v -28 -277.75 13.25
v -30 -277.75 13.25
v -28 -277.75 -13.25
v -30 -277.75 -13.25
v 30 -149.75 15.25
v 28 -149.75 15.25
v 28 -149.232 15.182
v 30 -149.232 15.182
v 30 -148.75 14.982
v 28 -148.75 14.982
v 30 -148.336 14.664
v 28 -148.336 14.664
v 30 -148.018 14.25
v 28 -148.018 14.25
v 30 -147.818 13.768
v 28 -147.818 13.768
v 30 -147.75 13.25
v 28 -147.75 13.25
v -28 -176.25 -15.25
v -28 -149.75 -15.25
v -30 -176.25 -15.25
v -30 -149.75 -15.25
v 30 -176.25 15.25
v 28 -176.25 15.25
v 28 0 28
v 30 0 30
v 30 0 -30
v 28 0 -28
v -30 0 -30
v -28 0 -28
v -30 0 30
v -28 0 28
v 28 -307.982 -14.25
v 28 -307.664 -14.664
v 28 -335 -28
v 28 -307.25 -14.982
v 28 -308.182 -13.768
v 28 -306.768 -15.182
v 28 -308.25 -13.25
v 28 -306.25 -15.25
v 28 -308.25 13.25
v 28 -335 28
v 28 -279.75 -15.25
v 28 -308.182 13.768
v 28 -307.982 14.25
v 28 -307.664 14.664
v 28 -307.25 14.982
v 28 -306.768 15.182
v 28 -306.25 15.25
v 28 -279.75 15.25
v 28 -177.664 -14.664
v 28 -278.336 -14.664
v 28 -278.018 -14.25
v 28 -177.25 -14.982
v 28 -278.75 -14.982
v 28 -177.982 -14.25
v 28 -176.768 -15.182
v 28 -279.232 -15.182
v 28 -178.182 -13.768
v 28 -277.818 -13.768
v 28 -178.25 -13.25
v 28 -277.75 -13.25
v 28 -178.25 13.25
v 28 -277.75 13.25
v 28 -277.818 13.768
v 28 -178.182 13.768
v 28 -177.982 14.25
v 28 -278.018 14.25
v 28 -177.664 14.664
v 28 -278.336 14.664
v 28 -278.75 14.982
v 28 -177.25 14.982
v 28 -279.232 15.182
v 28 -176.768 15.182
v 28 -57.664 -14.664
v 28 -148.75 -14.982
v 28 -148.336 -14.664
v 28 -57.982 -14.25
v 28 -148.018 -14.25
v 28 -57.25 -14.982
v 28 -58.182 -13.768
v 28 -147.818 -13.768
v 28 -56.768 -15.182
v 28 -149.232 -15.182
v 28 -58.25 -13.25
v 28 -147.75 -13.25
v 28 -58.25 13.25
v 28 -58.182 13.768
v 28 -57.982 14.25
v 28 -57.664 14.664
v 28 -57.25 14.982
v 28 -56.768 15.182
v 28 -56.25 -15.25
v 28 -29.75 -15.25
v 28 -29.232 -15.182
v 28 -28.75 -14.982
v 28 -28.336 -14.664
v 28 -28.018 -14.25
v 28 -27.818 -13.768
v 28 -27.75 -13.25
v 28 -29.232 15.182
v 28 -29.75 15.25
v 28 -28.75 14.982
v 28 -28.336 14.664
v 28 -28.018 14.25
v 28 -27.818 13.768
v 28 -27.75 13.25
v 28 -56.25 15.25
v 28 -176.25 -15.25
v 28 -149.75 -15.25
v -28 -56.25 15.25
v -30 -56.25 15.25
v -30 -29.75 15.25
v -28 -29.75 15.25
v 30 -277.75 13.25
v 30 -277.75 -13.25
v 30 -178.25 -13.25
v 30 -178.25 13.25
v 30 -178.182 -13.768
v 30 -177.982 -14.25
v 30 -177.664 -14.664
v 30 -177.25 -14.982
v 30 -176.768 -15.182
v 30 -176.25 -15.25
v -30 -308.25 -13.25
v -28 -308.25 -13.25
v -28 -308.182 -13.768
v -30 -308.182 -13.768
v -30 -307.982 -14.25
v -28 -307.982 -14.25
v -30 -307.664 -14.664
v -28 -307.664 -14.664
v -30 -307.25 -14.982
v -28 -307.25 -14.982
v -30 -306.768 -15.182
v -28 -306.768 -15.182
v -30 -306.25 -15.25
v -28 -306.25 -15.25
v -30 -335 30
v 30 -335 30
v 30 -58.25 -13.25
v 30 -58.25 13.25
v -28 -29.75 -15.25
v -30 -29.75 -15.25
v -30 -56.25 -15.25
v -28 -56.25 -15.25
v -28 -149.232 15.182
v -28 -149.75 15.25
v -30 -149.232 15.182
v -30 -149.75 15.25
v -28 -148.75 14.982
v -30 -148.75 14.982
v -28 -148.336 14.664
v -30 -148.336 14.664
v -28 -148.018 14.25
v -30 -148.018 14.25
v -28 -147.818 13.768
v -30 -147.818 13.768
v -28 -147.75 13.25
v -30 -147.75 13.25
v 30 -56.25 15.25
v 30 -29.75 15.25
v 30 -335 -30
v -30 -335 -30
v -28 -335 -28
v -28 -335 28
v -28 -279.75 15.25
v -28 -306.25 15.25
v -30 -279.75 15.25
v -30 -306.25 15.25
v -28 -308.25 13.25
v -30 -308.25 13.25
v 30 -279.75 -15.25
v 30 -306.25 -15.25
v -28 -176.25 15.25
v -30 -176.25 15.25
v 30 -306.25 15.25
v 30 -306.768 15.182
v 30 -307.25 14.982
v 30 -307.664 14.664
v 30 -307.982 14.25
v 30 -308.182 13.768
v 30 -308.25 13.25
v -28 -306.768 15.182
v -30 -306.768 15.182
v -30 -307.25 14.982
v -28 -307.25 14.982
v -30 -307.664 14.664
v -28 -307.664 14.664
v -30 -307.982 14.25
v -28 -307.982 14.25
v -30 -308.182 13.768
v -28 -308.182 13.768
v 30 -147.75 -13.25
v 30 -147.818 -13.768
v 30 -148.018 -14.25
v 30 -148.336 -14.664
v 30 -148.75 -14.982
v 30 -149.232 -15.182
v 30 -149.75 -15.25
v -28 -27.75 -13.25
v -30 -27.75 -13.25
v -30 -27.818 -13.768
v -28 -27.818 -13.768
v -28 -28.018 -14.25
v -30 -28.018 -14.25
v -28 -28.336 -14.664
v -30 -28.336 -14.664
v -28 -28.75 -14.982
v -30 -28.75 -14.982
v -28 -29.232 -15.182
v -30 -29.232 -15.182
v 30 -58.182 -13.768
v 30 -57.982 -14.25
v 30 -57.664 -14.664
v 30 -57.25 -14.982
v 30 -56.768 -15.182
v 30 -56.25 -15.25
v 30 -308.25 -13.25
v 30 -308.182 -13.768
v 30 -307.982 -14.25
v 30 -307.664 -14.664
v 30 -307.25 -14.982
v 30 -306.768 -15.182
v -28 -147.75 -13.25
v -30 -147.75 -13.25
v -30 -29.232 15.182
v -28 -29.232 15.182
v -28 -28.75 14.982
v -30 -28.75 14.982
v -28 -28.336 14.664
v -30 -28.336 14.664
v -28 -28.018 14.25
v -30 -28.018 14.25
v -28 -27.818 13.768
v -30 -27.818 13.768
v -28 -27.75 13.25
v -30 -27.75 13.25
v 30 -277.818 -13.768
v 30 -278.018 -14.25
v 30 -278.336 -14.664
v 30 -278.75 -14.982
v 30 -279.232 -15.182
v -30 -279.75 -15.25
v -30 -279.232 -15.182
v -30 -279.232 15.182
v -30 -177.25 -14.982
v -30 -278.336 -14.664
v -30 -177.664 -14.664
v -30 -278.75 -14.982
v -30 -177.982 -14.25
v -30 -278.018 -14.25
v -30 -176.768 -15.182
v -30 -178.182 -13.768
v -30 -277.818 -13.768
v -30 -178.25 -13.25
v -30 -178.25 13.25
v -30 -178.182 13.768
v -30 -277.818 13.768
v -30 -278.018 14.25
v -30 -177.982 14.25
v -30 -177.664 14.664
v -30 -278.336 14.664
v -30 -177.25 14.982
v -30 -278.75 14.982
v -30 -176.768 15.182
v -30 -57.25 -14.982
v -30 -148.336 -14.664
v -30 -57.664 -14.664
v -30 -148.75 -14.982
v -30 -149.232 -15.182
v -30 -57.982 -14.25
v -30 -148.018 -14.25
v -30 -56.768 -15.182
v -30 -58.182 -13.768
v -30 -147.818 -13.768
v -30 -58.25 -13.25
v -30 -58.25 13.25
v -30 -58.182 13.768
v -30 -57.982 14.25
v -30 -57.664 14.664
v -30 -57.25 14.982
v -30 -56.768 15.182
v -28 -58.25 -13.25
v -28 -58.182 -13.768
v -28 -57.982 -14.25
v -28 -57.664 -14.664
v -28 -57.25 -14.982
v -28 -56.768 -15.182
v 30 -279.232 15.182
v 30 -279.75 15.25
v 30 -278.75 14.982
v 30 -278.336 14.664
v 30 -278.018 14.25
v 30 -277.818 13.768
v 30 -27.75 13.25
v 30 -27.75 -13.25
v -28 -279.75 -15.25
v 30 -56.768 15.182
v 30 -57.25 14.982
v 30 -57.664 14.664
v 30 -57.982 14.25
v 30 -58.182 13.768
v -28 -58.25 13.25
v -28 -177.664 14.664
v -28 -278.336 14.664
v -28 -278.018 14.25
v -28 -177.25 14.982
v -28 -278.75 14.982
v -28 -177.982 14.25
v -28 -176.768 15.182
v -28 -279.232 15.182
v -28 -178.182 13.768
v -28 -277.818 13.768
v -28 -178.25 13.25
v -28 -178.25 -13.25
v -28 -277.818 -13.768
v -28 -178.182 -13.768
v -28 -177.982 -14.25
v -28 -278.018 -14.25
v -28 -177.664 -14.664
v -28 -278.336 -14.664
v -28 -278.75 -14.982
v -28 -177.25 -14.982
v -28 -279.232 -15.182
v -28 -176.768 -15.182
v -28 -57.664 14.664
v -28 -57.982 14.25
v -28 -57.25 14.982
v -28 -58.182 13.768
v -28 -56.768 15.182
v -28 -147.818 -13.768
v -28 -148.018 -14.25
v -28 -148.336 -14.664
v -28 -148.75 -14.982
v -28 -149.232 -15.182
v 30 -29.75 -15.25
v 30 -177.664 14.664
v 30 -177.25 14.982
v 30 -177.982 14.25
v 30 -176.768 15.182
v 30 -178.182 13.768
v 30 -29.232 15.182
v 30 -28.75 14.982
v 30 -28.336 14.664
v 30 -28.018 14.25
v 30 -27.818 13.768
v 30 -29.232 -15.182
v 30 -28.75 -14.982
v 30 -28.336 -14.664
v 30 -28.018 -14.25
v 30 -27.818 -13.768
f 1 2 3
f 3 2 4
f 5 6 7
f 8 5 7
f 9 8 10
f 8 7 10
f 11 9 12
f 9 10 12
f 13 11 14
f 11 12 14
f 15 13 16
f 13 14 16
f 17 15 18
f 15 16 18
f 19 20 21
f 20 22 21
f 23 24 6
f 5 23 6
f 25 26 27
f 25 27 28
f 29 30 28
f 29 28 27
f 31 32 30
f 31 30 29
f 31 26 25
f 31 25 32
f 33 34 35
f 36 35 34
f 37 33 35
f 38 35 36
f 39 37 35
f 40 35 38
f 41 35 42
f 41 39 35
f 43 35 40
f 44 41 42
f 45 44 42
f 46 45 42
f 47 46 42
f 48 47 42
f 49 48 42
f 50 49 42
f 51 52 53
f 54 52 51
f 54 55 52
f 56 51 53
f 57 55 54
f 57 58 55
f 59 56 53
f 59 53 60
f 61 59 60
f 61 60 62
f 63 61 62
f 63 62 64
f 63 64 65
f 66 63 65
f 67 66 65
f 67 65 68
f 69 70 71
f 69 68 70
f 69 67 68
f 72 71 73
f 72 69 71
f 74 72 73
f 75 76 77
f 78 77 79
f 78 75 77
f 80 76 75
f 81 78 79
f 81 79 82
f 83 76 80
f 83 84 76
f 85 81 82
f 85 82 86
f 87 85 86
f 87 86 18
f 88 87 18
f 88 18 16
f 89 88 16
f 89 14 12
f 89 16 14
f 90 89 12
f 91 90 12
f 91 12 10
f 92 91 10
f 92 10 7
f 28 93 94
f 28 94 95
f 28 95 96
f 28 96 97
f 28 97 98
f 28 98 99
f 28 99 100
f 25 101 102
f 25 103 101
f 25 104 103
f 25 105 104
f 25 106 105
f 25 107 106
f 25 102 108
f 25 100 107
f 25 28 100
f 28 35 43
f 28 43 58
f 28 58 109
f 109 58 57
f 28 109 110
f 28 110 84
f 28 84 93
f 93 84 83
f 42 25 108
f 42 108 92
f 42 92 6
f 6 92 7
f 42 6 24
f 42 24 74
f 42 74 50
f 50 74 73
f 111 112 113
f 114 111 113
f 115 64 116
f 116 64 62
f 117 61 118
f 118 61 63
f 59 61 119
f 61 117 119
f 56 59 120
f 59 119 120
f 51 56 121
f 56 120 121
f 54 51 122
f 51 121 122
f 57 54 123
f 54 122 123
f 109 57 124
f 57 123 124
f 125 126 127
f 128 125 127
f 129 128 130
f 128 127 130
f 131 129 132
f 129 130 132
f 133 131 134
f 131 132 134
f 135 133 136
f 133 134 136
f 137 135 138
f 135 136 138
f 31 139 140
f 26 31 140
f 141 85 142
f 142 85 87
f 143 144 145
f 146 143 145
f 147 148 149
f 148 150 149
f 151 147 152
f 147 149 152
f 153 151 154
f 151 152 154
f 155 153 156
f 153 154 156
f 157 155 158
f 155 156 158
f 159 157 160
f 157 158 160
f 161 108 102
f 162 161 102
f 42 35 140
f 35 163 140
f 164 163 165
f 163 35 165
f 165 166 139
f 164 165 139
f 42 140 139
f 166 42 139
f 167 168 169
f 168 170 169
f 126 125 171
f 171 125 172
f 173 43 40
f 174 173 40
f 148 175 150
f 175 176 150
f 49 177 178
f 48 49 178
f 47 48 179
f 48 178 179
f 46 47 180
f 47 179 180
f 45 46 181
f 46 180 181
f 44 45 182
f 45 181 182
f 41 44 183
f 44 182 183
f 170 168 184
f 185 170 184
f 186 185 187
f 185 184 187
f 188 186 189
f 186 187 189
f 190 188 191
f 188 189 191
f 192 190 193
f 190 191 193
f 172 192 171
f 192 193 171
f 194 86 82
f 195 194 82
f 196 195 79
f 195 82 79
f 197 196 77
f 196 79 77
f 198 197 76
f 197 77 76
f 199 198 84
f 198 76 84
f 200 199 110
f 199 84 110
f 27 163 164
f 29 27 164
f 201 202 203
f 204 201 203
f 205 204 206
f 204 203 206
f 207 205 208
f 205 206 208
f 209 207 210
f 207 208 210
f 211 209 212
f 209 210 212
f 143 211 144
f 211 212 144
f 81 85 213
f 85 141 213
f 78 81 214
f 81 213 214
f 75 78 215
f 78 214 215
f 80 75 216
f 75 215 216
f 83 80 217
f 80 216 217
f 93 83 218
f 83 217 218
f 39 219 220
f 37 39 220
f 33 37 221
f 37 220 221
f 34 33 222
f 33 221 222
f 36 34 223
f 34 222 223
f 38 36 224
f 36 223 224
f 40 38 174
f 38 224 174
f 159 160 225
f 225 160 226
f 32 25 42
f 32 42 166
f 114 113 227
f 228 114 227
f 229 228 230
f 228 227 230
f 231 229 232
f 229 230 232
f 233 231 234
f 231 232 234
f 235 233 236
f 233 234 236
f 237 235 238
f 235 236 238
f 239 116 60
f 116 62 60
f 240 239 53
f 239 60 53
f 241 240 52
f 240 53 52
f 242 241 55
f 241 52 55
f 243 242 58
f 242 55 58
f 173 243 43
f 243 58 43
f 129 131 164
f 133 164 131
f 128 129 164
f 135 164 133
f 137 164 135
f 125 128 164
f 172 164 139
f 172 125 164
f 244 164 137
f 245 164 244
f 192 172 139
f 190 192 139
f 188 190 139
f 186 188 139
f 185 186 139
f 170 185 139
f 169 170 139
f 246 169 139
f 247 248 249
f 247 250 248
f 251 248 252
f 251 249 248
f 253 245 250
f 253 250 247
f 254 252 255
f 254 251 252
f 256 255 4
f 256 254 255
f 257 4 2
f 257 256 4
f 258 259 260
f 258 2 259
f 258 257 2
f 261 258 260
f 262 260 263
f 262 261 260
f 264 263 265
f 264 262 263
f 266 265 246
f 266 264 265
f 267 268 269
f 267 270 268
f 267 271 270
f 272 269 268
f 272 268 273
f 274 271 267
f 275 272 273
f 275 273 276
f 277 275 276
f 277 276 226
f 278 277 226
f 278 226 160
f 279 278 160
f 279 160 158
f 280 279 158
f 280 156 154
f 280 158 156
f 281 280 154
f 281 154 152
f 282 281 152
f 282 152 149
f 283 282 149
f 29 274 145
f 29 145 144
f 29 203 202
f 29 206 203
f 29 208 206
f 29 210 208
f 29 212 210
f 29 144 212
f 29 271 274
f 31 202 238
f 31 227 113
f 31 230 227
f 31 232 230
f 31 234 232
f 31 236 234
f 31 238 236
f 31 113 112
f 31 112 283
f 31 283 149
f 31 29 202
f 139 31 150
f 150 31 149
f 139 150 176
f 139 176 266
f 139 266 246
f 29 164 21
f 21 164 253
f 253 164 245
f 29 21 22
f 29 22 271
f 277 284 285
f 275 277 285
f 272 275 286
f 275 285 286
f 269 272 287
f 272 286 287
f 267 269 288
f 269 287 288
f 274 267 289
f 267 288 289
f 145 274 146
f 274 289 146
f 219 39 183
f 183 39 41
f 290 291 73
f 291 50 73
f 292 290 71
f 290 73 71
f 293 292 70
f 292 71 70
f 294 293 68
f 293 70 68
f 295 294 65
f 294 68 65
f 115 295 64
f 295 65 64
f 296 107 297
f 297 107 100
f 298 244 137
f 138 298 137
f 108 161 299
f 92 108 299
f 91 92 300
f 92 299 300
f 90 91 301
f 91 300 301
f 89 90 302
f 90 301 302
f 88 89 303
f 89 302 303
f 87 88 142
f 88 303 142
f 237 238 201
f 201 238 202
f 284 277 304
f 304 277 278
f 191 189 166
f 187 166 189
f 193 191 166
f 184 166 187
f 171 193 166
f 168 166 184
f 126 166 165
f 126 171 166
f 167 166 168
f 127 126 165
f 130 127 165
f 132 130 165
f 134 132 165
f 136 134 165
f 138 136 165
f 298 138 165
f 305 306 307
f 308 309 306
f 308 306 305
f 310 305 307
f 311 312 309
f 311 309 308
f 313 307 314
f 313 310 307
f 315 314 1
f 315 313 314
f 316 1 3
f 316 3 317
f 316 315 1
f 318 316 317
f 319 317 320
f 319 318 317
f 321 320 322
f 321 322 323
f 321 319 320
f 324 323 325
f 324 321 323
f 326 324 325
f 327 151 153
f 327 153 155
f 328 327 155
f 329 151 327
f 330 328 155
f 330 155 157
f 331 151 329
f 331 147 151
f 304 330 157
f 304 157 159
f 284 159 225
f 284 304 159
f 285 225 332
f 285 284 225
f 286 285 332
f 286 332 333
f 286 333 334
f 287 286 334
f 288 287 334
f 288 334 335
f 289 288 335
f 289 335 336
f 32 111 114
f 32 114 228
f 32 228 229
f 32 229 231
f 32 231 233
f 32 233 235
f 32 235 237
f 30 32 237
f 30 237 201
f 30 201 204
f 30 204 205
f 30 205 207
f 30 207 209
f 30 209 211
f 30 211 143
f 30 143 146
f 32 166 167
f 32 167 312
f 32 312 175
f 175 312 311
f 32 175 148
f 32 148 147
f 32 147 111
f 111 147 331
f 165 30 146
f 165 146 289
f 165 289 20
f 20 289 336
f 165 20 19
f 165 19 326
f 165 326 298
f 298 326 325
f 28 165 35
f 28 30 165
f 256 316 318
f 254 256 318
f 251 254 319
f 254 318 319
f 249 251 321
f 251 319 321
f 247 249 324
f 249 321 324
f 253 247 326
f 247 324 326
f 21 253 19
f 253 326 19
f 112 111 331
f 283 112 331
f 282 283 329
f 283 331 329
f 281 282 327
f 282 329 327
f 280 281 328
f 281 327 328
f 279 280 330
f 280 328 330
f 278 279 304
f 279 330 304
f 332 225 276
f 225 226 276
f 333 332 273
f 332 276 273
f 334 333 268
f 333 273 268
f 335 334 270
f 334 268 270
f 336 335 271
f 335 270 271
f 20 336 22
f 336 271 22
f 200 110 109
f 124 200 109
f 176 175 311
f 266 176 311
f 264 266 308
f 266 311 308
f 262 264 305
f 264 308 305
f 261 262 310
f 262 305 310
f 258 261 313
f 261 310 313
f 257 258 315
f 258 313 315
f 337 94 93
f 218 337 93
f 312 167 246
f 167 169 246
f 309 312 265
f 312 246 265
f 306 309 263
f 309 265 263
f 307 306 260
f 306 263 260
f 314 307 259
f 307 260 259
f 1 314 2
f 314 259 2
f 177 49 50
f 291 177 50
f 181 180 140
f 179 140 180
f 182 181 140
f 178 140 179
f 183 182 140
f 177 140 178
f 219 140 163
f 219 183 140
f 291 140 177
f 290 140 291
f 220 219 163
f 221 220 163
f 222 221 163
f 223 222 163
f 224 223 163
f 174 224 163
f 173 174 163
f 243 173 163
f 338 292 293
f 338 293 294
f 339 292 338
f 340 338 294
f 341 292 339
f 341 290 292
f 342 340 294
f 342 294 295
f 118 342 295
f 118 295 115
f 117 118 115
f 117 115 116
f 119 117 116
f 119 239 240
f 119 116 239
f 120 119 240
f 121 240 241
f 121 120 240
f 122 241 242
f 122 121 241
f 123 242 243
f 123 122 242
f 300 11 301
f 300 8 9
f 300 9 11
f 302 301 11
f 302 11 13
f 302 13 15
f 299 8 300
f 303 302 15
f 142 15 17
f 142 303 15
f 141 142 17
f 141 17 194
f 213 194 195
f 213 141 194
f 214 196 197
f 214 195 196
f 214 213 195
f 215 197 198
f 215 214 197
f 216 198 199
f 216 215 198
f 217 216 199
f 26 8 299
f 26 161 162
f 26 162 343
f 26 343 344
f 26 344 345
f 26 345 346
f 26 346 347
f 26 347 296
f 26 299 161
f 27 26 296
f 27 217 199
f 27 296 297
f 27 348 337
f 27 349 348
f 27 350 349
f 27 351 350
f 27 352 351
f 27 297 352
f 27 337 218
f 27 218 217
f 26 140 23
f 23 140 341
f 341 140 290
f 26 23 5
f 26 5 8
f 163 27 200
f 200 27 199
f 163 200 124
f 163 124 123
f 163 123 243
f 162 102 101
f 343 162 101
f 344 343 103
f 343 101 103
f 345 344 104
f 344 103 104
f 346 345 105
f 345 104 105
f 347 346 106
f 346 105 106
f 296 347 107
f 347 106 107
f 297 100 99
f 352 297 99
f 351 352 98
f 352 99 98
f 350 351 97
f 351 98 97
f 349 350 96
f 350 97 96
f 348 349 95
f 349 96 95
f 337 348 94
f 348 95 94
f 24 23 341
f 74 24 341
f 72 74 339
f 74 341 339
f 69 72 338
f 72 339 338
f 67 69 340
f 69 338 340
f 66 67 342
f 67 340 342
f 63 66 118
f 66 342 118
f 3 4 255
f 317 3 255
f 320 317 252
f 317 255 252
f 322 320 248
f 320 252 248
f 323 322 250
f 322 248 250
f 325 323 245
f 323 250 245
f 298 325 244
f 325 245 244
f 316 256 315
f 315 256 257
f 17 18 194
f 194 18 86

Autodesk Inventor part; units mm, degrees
ref_plane "YZ Plane" through (0, 0, 0) normal (1, 0, 0) x (0, 1, 0)
ref_plane "XZ Plane" through (0, 0, 0) normal (0, 1, 0) x (-1, 0, 0)
ref_plane "XY Plane" through (0, 0, 0) normal (0, 0, 1) x (1, 0, 0)
sketch "Sketch9" plane through (0, 0, 0) normal (0, 1, 0) x (-1, 0, 0)
  line L0 (30, 30) -> (-30, 30)
  line L1 (-30, 30) -> (-30, -30)
  line L2 (-30, -30) -> (30, -30)
  line L3 (30, -30) -> (30, 30)
  line L4 (30, 30) -> (-30, -30) construction
  line L5 (-30, 30) -> (30, -30) construction
  line L6 (-28, 28) -> (28, 28)
  line L7 (28, 28) -> (28, -28)
  line L8 (28, -28) -> (-28, -28)
  line L9 (-28, -28) -> (-28, 28)
  point P0 (0, 0)
  dimension "d172" = 60
  dimension "d173" = 60
  dimension "d174" = 2
extrude "Extrusion3" add sketch "Sketch9" against normal blind 335
sketch "Sketch10" plane through (0, 0, 0) normal (1, 0, 0) x (0, 1, 0)
  line L0 (0, 30) -> (0, -30) construction
  line L1 (0, 30) -> (-335, 30) construction
  line L2 (-335, -30) -> (-335, 30) construction
  line L3 (0, -30) -> (-335, -30) construction
  line L4 (-58.25, 15.25) -> (-27.75, 15.25)
  line L5 (-27.75, 15.25) -> (-27.75, -15.25)
  line L6 (-27.75, -15.25) -> (-58.25, -15.25)
  line L7 (-58.25, -15.25) -> (-58.25, 15.25)
  line L8 (-58.25, 15.25) -> (-27.75, -15.25) construction
  line L9 (-27.75, 15.25) -> (-58.25, -15.25) construction
  line L10 (-178.25, 15.25) -> (-147.75, 15.25)
  line L11 (-147.75, 15.25) -> (-147.75, -15.25)
  line L12 (-147.75, -15.25) -> (-178.25, -15.25)
  line L13 (-178.25, -15.25) -> (-178.25, 15.25)
  line L14 (-178.25, 15.25) -> (-147.75, -15.25) construction
  line L15 (-147.75, 15.25) -> (-178.25, -15.25) construction
  line L16 (-308.25, 15.25) -> (-277.75, 15.25)
  line L17 (-277.75, 15.25) -> (-277.75, -15.25)
  line L18 (-277.75, -15.25) -> (-308.25, -15.25)
  line L19 (-308.25, -15.25) -> (-308.25, 15.25)
  line L20 (-308.25, 15.25) -> (-277.75, -15.25) construction
  line L21 (-277.75, 15.25) -> (-308.25, -15.25) construction
  circle A0 centre (-453, 0) radius 9
  line L22 (0, 0) -> (47, 0)
  point P0 (-43, 0)
  point P1 (-163, 0)
  point P2 (-293, 0)
  dimension "d177" = 30.5
  dimension "d178" = 30.5
  dimension "d181" = 47
  dimension "d182" = 90
  dimension "d183" = 210
  dimension "d184" = 340
  dimension "d185" = 500
  dimension "d186" = 18
extrude "Extrusion4" cut sketch "Sketch10" along normal through all both and the other way through all contours L4 L5 L6 L7 | L10 L11 L12 L13 | L16 L17 L18 L19
sketch "Sketch11" plane through (30, 0, 30) normal (1, 0, 0) x (0, 0, -1)
  line L0 (45.25, -178.25) -> (14.75, -178.25) projected
  line L1 (14.75, -178.25) -> (14.75, -147.75) projected
  line L2 (14.75, -147.75) -> (45.25, -147.75) projected
  line L3 (45.25, -147.75) -> (45.25, -178.25) projected
  line L4 (45.25, -58.25) -> (14.75, -58.25) projected
  line L5 (14.75, -58.25) -> (14.75, -27.75) projected
  line L6 (14.75, -27.75) -> (45.25, -27.75) projected
  line L7 (45.25, -27.75) -> (45.25, -58.25) projected
  line L8 (45.25, -308.25) -> (14.75, -308.25) projected
  line L9 (14.75, -308.25) -> (14.75, -277.75) projected
  line L10 (14.75, -277.75) -> (45.25, -277.75) projected
  line L11 (45.25, -277.75) -> (45.25, -308.25) projected
  line L12 (0, 0) -> (60, 0) projected
  line L13 (0, 0) -> (0, -335) projected
  line L14 (60, -335) -> (0, -335) projected
  line L15 (60, 0) -> (60, -335) projected
  line L16 (45.25, -27.75) -> (14.75, -58.25)
  line L17 (45.25, -147.75) -> (14.75, -178.25)
  line L18 (45.25, -277.75) -> (14.75, -308.25)
  point P0 (30, 0)
sketch "Sketch13" plane through (-30, 0, -30) normal (-1, 0, 0) x (0, 0, 1)
  line L0 (45.25, -178.25) -> (14.75, -178.25) projected
  line L1 (14.75, -178.25) -> (14.75, -147.75) projected
  line L2 (14.75, -147.75) -> (45.25, -147.75) projected
  line L3 (45.25, -147.75) -> (45.25, -178.25) projected
  line L4 (45.25, -58.25) -> (14.75, -58.25) projected
  line L5 (14.75, -58.25) -> (14.75, -27.75) projected
  line L6 (14.75, -27.75) -> (45.25, -27.75) projected
  line L7 (45.25, -27.75) -> (45.25, -58.25) projected
  line L8 (45.25, -308.25) -> (14.75, -308.25) projected
  line L9 (14.75, -308.25) -> (14.75, -277.75) projected
  line L10 (14.75, -277.75) -> (45.25, -277.75) projected
  line L11 (45.25, -277.75) -> (45.25, -308.25) projected
  line L12 (0, 0) -> (60, 0) projected
  line L13 (0, 0) -> (0, -335) projected
  line L14 (60, -335) -> (0, -335) projected
  line L15 (60, 0) -> (60, -335) projected
  line L16 (14.75, -58.25) -> (45.25, -27.75)
  line L17 (14.75, -178.25) -> (45.25, -147.75)
  line L18 (14.75, -308.25) -> (45.25, -277.75)
  point P0 (30, 0)
fillet "Fillet1" radius 2 24 edges at (29, -277.75, -15.25) (29, -277.75, 15.25) (29, -308.25, 15.25) (29, -308.25, -15.25) (29, -178.25, -15.25) (29, -178.25, 15.25) (29, -147.75, 15.25) (29, -147.75, -15.25) (29, -58.25, 15.25) (29, -27.75, 15.25) (29, -27.75, -15.25) (29, -58.25, -15.25) (-29, -58.25, 15.25) (-29, -27.75, 15.25) (-29, -27.75, -15.25) (-29, -58.25, -15.25) (-29, -147.75, 15.25) (-29, -178.25, 15.25) (-29, -178.25, -15.25) (-29, -147.75, -15.25) (-29, -277.75, 15.25) (-29, -308.25, 15.25) (-29, -277.75, -15.25) (-29, -308.25, -15.25)
properties part number "TZS 1653 FDS 940 Diameter beam" material "Stainless Steel"
